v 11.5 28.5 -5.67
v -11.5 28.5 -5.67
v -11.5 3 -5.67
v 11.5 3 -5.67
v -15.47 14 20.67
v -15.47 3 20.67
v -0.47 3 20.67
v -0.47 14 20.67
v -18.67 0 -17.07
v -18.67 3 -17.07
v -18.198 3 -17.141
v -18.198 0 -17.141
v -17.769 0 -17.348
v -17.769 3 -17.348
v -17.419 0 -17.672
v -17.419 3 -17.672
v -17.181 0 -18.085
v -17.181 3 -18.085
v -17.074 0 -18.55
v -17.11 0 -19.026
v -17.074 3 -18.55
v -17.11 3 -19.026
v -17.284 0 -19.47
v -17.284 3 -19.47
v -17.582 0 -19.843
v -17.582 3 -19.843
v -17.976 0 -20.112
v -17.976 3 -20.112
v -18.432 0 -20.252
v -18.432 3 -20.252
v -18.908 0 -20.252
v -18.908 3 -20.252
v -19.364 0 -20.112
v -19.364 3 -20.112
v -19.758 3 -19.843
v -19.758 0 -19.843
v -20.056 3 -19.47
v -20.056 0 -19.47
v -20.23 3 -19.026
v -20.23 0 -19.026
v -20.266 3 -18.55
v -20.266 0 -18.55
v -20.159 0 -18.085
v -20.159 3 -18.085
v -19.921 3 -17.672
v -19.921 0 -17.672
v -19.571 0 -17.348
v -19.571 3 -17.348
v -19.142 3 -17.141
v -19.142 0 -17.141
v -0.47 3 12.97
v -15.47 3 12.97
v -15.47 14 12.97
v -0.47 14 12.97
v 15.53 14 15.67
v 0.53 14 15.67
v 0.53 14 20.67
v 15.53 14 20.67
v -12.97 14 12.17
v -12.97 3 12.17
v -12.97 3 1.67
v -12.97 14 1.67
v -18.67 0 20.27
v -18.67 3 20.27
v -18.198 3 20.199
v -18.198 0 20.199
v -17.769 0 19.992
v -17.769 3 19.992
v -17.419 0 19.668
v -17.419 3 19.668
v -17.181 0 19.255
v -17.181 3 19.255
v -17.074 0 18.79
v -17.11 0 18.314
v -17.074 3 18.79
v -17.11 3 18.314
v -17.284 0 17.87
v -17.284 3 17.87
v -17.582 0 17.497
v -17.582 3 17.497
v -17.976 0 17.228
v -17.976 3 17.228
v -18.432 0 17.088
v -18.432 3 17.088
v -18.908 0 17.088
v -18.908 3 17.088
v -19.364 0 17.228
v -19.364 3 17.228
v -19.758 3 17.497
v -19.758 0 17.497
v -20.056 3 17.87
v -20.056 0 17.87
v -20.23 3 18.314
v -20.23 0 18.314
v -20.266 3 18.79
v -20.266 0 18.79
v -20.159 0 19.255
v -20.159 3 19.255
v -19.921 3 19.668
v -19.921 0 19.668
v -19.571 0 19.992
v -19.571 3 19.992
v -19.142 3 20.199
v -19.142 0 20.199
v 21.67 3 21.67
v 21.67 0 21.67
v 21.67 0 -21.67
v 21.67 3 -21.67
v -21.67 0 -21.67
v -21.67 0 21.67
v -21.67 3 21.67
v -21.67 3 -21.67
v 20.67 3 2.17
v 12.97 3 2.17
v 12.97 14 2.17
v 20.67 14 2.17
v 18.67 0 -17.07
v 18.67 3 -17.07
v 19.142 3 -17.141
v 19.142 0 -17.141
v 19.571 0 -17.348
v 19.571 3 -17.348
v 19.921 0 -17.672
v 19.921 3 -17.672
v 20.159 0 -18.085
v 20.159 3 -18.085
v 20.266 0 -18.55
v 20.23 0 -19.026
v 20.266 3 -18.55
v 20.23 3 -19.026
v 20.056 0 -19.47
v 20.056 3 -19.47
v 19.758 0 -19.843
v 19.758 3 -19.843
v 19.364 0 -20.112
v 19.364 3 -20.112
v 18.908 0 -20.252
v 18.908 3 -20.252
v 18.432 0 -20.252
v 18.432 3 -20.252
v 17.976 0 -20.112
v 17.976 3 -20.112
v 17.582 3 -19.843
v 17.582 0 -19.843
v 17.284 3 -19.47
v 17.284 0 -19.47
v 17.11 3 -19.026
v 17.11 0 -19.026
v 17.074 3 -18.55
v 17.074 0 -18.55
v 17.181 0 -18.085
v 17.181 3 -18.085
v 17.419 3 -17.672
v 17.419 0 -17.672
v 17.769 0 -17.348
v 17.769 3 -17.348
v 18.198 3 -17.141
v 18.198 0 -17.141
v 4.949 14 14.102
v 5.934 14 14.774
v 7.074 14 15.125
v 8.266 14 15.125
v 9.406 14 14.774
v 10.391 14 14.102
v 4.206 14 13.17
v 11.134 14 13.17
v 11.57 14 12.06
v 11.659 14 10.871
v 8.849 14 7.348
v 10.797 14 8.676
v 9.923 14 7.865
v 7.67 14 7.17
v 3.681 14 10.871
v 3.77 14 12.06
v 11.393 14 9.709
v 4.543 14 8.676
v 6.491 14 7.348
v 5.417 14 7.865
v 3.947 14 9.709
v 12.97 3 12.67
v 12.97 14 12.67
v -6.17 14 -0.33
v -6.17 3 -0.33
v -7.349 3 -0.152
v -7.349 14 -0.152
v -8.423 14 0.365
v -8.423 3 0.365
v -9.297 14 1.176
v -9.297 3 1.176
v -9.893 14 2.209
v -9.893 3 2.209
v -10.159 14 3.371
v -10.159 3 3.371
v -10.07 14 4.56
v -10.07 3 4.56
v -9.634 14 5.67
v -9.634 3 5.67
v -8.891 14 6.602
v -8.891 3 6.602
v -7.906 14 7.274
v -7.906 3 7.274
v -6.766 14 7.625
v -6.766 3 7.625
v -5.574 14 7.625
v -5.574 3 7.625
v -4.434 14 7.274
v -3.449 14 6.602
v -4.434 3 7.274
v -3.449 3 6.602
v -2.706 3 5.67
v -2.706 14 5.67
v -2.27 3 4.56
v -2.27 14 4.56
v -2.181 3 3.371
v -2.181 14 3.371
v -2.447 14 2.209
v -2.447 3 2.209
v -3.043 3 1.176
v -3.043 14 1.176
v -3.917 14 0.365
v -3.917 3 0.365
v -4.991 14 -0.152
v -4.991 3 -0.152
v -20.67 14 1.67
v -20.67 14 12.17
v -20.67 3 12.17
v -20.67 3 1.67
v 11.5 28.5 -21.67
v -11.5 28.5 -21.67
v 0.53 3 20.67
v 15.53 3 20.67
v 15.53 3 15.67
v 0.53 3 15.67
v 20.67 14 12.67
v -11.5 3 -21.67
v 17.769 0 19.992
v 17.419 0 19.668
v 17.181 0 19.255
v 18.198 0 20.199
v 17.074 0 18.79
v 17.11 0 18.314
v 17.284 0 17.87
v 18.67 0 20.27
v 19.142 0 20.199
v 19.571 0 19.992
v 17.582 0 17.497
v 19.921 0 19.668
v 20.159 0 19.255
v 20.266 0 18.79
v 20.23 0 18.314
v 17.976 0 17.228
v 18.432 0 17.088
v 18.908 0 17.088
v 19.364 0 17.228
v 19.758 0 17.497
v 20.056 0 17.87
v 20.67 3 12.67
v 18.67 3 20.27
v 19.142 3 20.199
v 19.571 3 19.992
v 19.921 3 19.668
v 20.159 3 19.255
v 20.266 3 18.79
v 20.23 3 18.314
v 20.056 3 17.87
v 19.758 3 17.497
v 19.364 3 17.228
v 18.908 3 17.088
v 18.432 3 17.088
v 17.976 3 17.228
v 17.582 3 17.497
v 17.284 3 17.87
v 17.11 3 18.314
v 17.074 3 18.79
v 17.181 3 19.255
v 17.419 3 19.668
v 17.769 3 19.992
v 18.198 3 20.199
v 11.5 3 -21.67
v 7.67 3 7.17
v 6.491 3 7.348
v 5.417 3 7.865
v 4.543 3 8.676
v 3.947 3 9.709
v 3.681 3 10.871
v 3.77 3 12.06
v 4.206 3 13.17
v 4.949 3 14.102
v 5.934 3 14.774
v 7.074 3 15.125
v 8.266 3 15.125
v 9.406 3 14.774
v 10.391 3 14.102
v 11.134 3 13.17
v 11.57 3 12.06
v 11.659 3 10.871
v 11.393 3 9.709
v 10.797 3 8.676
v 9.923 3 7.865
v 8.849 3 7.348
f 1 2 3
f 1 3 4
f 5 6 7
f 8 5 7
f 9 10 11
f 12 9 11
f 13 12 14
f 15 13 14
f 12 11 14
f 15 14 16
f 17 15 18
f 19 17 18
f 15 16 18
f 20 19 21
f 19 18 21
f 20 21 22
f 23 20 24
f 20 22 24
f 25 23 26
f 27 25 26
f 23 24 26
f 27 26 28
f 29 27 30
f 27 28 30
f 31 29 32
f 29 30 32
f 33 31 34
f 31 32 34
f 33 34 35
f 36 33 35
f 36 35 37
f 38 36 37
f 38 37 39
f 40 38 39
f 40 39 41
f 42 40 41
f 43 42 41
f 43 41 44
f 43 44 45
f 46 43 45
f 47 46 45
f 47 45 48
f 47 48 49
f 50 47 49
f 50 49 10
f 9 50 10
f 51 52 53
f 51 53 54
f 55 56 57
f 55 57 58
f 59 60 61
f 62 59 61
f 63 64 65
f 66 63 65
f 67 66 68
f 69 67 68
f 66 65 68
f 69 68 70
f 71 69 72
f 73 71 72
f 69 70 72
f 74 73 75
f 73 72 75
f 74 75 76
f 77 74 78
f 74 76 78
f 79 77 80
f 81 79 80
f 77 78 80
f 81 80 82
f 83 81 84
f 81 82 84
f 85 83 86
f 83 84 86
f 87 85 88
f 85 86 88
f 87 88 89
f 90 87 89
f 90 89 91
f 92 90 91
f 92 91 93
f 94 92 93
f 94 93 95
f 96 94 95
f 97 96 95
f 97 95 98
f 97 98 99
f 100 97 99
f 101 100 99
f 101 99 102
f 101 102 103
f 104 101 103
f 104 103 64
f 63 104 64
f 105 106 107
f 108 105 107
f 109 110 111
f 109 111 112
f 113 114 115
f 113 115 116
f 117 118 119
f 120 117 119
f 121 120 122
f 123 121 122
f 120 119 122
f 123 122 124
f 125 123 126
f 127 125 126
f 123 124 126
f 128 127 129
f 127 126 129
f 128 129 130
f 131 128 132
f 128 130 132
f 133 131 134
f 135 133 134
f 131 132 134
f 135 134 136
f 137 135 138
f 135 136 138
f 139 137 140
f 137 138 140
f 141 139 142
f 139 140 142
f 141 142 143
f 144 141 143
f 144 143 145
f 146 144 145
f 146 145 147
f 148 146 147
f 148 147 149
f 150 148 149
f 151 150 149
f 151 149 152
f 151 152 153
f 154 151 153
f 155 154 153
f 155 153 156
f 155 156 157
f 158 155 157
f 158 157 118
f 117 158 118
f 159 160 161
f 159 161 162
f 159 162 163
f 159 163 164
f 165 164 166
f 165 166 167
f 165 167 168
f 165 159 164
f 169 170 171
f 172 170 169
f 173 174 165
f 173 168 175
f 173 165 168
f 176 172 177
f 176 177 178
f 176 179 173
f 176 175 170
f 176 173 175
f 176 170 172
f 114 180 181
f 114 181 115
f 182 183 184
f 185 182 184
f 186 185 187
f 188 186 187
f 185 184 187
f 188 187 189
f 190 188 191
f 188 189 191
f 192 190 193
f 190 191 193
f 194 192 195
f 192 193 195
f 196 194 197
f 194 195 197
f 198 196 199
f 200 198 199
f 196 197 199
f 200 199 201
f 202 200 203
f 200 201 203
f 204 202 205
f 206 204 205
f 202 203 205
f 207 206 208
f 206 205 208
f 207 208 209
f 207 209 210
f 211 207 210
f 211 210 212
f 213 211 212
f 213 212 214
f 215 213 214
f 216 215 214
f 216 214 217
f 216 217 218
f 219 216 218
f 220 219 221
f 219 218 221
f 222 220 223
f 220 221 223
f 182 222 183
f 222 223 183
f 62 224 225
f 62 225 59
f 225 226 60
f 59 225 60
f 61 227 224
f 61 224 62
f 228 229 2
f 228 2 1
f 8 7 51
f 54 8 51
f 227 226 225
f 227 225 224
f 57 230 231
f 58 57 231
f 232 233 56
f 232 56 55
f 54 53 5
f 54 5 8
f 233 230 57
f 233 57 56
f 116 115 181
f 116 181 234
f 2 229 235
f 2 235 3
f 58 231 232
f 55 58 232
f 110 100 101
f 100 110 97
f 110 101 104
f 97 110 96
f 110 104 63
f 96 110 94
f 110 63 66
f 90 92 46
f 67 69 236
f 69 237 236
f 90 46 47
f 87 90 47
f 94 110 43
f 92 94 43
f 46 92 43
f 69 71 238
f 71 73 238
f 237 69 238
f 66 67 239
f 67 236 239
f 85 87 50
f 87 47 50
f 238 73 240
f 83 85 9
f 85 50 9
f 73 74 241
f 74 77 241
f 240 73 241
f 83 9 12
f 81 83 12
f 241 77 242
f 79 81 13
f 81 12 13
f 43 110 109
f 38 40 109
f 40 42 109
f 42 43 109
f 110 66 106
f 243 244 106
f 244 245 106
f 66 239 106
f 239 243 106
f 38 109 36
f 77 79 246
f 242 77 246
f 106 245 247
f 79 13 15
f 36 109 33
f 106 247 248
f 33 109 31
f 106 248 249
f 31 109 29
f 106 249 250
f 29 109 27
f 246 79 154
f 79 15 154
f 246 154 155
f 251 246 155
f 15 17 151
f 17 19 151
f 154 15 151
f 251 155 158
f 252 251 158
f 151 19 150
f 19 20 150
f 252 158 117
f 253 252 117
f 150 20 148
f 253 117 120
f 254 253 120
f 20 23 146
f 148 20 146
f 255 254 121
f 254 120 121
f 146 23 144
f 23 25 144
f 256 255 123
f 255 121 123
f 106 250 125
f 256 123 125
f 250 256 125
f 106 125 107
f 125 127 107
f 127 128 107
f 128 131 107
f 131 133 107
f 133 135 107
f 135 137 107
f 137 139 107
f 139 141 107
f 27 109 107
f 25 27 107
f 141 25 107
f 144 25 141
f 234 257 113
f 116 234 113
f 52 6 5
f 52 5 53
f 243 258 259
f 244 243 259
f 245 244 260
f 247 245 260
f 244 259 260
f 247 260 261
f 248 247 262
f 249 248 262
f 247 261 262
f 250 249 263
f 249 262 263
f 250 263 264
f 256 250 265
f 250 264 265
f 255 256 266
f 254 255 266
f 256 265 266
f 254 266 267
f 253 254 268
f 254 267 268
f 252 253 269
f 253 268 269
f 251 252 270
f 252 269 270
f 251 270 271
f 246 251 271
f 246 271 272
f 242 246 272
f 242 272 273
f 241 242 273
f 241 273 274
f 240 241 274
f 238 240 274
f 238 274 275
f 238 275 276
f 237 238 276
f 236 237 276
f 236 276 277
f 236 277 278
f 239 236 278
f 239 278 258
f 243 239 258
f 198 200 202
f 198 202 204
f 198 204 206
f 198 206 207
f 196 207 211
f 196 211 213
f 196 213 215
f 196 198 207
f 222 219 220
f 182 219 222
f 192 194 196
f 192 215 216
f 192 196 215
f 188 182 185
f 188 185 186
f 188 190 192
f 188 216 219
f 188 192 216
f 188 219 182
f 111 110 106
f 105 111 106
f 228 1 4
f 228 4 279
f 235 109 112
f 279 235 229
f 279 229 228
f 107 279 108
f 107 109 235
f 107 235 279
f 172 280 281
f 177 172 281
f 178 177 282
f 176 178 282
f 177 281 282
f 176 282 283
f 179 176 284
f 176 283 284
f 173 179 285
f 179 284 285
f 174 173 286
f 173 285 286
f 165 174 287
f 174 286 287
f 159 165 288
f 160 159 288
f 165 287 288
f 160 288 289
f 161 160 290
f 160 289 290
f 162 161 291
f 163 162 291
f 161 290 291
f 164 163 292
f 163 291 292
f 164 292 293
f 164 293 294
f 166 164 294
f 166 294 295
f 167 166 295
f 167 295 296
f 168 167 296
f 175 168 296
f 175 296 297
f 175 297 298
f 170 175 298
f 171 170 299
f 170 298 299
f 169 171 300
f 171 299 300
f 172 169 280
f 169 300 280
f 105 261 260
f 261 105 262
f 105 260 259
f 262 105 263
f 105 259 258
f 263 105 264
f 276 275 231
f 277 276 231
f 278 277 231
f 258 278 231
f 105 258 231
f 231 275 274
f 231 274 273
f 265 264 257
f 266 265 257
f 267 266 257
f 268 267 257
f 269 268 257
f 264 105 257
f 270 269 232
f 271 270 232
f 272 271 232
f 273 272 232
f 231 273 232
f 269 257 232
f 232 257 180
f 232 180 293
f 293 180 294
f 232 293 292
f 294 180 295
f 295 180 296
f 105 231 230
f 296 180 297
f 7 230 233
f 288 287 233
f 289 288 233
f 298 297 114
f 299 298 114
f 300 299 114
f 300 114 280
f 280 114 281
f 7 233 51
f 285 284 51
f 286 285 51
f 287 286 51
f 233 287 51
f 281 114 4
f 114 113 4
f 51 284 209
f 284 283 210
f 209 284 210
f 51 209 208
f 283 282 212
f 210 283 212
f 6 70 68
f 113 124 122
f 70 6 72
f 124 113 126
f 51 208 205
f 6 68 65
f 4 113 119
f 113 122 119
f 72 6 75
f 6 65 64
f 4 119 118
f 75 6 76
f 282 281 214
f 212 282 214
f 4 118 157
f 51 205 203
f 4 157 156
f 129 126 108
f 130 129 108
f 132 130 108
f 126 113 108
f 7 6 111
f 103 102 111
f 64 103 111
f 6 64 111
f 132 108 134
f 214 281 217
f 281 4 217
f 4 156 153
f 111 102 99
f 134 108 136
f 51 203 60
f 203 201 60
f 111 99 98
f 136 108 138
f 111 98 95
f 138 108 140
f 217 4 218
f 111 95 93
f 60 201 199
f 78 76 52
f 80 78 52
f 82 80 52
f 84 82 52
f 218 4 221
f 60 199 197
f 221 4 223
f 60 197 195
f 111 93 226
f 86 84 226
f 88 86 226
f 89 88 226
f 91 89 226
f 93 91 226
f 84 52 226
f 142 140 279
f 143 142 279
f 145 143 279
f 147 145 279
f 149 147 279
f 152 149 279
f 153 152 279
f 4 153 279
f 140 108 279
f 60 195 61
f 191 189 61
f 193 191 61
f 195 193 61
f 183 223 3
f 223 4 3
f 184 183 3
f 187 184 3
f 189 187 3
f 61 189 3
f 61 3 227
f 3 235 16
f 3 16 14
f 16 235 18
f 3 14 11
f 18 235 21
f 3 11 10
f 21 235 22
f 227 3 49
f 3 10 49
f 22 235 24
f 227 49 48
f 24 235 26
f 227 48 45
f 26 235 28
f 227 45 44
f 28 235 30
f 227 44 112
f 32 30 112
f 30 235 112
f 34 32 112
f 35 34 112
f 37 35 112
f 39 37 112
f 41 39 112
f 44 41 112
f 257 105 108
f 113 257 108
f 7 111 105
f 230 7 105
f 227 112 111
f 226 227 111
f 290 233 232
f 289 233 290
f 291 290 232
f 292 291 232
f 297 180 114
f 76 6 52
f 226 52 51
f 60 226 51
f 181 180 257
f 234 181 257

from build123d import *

# Parameters (mm, degrees)
SKETCH_1_W          = 43.34
SKETCH_1_H          = 43.34
EXTRUDE_1_DEPTH     = 28.5
CUT_EXTRUDE_1_DEPTH = 25.5
SKETCH_3_R          = 4
SKETCH_3_W          = 7.7
SKETCH_3_H          = 10.5
SKETCH_3_W_2        = 15
SKETCH_3_H_2        = 7.7
SKETCH_3_H_3        = 5
EXTRUDE_2_DEPTH     = 11
SKETCH_4_R          = 1.6
CUT_EXTRUDE_2_DEPTH = 40.867628472


with BuildPart() as part:
    # 스케치1 → 보스-돌출1 (new body)
    with BuildSketch(Plane(origin=(0, 0, 0), x_dir=(1, 0, 0), z_dir=(0, 1, 0))):
        Rectangle(SKETCH_1_W, SKETCH_1_H)
    extrude(amount=EXTRUDE_1_DEPTH)

    # 스케치2 → 컷-돌출1 (cut)
    with BuildSketch(Plane(origin=(0, 28.5, 0), x_dir=(1, 0, 0), z_dir=(0, 1, 0))):
        Polygon((-11.5, 21.67), (-11.5, 5.67), (11.5, 5.67), (11.5, 21.67), (21.67, 21.67), (21.67, -21.67), (-21.67, -21.67), (-21.67, 21.67), align=None)
    extrude(amount=-CUT_EXTRUDE_1_DEPTH, mode=Mode.SUBTRACT)

    # 스케치3 → 보스-돌출2 (add)
    with BuildSketch(Plane(origin=(0, 3, 0), x_dir=(1, 0, 0), z_dir=(0, 1, 0))):
        with Locations(Location((-6.17, -3.67, 0), (0, 0, 90))):
            Circle(SKETCH_3_R)
        with Locations(Location((7.67, -11.17, 0), (0, 0, 90))):
            Circle(SKETCH_3_R)
        with Locations((-16.82, -6.92)):
            Rectangle(SKETCH_3_W, SKETCH_3_H)
        with Locations((-7.97, -16.82)):
            Rectangle(SKETCH_3_W_2, SKETCH_3_H_2)
        with Locations((8.03, -18.17)):
            Rectangle(SKETCH_3_W_2, SKETCH_3_H_3)
        with Locations((16.82, -7.42)):
            Rectangle(SKETCH_3_W, SKETCH_3_H)
    extrude(amount=EXTRUDE_2_DEPTH)

    # 스케치4 → 컷-돌출2 (cut, through all)
    with BuildSketch(Plane(origin=(0, 3, 0), x_dir=(1, 0, 0), z_dir=(0, 1, 0))):
        with Locations(Location((-18.67, 18.67, 0), (0, 0, 270))):
            Circle(SKETCH_4_R)
        with Locations(Location((18.67, 18.67, 0), (0, 0, 270))):
            Circle(SKETCH_4_R)
        with Locations(Location((18.67, -18.67, 0), (0, 0, 270))):
            Circle(SKETCH_4_R)
        with Locations(Location((-18.67, -18.67, 0), (0, 0, 270))):
            Circle(SKETCH_4_R)
    extrude(amount=-CUT_EXTRUDE_2_DEPTH, mode=Mode.SUBTRACT)


solid = part.part
